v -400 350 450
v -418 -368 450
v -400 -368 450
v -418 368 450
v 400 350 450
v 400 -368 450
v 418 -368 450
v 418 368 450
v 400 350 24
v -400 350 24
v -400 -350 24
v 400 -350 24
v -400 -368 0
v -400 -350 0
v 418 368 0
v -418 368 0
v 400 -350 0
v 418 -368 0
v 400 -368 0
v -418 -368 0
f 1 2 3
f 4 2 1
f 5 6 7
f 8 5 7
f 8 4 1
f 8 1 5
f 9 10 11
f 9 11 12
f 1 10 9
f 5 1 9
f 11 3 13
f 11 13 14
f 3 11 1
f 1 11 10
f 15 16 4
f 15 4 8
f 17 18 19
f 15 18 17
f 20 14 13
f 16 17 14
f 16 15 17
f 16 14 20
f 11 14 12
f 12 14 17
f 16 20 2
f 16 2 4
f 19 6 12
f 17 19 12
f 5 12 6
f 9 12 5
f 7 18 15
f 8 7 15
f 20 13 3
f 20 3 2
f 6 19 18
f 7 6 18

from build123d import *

# Parameters (mm, degrees)
F0_W     = 800
F0_H     = 700
F1_DEPTH = 24
F2_W     = 18
F2_H     = 736
F3_DEPTH = 450
F4_W     = 800
F4_H     = 18
F6_DEPTH = 450


with BuildPart() as f1:
    # F0 (on Top) → F1 (new body)
    with BuildSketch(Plane.XY):
        Rectangle(F0_W, F0_H)
    extrude(amount=F1_DEPTH)

    # F2 (on Top) → F3 (join)
    with BuildSketch(Plane.XY):
        with Locations((409, 0)):
            Rectangle(F2_W, F2_H)
    extrude(amount=F3_DEPTH)

    # F5: F1 across plane


with BuildPart() as f1_1:
    add(f1.part)
    add(f1.part.mirror(Plane.YZ))

    # F4 (on Top) → F6 (join)
    with BuildSketch(Plane.XY):
        with Locations((0, 359)):
            Rectangle(F4_W, F4_H)
    extrude(amount=F6_DEPTH)


solid = f1_1.part
